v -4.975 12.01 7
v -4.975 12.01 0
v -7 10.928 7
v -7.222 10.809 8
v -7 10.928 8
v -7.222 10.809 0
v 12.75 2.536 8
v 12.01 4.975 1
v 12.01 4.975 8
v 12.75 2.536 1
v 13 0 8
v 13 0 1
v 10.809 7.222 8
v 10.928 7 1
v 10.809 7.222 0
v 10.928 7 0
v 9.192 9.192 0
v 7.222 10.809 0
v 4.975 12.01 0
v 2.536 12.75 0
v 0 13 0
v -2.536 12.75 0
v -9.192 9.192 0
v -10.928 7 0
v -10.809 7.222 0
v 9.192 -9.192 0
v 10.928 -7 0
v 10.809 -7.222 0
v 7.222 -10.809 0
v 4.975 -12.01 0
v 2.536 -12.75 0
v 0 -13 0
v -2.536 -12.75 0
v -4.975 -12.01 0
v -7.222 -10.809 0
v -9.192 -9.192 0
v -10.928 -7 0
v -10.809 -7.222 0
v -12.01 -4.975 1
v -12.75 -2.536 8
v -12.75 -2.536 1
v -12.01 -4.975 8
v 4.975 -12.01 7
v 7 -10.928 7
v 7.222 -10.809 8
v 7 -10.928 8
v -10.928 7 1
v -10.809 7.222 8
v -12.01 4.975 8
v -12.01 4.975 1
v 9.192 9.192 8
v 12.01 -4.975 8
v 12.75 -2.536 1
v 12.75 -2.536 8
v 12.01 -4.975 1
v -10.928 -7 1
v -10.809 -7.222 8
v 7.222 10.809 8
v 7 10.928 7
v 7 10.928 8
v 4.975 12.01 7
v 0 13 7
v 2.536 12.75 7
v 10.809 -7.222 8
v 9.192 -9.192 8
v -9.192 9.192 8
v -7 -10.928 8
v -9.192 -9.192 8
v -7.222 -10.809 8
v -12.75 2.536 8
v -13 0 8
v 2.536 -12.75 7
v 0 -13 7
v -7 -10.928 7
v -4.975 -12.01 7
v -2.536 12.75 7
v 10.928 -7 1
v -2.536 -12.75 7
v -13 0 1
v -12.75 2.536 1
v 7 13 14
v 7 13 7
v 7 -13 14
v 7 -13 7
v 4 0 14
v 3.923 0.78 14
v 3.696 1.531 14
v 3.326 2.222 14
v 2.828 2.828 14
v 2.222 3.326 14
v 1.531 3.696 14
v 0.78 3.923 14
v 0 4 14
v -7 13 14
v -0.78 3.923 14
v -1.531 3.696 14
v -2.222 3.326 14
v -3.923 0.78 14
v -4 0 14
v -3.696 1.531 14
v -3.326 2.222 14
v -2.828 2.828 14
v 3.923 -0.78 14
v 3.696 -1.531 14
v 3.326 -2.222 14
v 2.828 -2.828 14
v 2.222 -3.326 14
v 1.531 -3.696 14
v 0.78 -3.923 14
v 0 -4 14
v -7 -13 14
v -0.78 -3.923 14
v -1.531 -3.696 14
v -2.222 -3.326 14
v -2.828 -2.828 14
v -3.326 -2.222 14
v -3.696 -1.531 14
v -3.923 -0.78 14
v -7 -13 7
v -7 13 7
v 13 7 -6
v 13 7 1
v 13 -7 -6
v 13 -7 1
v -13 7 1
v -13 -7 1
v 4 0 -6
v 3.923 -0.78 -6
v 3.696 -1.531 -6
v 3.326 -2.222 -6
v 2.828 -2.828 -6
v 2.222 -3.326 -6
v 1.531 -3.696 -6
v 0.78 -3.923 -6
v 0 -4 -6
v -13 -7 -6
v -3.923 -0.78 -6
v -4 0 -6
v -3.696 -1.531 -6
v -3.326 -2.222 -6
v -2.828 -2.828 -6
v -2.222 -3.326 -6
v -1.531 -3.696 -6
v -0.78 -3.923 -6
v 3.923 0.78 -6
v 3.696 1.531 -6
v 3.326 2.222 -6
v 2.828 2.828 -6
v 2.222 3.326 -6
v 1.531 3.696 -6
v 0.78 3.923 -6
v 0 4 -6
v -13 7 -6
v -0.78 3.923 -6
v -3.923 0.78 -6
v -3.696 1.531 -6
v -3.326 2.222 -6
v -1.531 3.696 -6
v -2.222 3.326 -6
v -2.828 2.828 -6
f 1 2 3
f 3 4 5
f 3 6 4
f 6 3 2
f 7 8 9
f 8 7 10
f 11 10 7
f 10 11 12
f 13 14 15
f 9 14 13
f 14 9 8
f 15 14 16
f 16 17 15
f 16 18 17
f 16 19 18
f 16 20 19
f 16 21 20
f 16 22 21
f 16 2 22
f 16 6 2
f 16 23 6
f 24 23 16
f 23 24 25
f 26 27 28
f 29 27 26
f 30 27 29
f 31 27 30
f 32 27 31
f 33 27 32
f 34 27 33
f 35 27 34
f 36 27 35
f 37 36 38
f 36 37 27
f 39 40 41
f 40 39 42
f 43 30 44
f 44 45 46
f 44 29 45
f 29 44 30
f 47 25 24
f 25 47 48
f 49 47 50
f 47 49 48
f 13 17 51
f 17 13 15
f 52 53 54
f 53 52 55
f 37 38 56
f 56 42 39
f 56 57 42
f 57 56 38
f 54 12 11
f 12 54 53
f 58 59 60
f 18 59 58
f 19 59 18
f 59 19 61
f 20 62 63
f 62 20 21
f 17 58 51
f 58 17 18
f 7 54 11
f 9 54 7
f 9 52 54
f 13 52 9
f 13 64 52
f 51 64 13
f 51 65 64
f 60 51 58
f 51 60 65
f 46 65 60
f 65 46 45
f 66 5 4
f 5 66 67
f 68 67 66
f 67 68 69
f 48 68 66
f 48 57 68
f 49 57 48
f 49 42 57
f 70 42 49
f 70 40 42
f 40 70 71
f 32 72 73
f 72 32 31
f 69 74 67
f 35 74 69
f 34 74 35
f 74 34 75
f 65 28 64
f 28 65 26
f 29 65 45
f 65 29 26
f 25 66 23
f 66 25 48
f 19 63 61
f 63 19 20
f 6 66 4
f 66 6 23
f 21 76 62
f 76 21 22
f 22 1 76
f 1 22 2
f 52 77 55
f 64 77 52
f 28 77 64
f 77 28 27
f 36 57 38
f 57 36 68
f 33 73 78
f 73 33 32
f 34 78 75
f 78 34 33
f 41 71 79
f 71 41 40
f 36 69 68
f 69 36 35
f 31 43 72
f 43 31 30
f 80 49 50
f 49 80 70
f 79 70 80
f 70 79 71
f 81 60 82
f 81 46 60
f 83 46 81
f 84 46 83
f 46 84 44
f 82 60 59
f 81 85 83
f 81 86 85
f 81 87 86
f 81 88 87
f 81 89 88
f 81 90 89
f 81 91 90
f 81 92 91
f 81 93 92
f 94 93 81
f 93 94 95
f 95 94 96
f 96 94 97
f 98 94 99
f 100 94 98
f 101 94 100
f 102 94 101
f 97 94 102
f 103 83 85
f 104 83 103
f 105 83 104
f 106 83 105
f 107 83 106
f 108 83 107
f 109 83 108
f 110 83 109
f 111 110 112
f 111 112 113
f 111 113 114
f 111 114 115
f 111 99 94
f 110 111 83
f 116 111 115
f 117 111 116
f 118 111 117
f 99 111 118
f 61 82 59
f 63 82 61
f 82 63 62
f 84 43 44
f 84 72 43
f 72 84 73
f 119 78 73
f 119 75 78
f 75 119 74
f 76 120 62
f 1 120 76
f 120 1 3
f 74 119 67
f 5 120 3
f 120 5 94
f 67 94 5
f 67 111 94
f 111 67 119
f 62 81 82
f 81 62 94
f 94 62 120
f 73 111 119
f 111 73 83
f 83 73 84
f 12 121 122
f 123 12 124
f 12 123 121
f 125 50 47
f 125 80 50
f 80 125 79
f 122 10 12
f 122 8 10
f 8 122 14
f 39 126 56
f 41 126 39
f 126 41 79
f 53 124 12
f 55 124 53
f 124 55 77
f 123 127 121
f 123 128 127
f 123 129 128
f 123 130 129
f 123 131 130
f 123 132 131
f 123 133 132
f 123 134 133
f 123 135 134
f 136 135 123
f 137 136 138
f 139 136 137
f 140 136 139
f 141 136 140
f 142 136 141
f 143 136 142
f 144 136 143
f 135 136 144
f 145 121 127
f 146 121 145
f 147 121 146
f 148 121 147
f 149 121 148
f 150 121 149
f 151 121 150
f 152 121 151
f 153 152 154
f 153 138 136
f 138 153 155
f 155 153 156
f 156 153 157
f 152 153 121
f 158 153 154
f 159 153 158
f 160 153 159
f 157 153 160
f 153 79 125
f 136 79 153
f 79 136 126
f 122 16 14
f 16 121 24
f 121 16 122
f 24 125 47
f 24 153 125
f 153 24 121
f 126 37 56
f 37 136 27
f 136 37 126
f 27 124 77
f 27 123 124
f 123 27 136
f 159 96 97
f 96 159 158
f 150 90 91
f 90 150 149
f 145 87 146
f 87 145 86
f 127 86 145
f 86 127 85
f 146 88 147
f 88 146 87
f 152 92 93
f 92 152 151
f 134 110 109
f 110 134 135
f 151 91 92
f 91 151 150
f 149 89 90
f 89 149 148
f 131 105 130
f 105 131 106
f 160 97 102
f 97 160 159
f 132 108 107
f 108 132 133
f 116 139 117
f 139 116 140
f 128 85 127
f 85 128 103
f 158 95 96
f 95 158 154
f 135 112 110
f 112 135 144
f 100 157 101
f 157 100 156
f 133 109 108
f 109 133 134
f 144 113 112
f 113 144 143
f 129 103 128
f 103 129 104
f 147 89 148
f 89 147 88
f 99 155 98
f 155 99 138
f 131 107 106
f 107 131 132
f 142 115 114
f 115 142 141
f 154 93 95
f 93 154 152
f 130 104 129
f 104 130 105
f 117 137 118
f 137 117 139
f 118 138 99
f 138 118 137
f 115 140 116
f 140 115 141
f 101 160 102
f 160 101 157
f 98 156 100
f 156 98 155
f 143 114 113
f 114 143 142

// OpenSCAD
$fn = 32;

// ----------------------------------------------------------------------
// Oldham coupling disc: 26 x 20 mm
// ----------------------------------------------------------------------

// --- parameters (mm) ---
disc_d = 26;              // disc diameter
disc_t = 8;               // disc thickness
tongue_w = 14;            // tongue width
tongue_h = 6;             // tongue height
bore_d = 8;               // centre lightening bore

module disc() {
  cylinder(h = disc_t, d = disc_d);
  /* tongue on the top face, sunk 1 mm into the disc */
  translate([-tongue_w / 2, -disc_d / 2, disc_t - 1]) cube([tongue_w, disc_d, tongue_h + 1]);
  /* slot wall on the bottom face, 90 degrees turned */
  translate([-disc_d / 2, -tongue_w / 2, -tongue_h]) cube([disc_d, tongue_w, tongue_h + 1]);
}

difference() {
  disc();
  translate([0, 0, -tongue_h - 1]) cylinder(h = disc_t + 2 * tongue_h + 2, d = bore_d);
}
